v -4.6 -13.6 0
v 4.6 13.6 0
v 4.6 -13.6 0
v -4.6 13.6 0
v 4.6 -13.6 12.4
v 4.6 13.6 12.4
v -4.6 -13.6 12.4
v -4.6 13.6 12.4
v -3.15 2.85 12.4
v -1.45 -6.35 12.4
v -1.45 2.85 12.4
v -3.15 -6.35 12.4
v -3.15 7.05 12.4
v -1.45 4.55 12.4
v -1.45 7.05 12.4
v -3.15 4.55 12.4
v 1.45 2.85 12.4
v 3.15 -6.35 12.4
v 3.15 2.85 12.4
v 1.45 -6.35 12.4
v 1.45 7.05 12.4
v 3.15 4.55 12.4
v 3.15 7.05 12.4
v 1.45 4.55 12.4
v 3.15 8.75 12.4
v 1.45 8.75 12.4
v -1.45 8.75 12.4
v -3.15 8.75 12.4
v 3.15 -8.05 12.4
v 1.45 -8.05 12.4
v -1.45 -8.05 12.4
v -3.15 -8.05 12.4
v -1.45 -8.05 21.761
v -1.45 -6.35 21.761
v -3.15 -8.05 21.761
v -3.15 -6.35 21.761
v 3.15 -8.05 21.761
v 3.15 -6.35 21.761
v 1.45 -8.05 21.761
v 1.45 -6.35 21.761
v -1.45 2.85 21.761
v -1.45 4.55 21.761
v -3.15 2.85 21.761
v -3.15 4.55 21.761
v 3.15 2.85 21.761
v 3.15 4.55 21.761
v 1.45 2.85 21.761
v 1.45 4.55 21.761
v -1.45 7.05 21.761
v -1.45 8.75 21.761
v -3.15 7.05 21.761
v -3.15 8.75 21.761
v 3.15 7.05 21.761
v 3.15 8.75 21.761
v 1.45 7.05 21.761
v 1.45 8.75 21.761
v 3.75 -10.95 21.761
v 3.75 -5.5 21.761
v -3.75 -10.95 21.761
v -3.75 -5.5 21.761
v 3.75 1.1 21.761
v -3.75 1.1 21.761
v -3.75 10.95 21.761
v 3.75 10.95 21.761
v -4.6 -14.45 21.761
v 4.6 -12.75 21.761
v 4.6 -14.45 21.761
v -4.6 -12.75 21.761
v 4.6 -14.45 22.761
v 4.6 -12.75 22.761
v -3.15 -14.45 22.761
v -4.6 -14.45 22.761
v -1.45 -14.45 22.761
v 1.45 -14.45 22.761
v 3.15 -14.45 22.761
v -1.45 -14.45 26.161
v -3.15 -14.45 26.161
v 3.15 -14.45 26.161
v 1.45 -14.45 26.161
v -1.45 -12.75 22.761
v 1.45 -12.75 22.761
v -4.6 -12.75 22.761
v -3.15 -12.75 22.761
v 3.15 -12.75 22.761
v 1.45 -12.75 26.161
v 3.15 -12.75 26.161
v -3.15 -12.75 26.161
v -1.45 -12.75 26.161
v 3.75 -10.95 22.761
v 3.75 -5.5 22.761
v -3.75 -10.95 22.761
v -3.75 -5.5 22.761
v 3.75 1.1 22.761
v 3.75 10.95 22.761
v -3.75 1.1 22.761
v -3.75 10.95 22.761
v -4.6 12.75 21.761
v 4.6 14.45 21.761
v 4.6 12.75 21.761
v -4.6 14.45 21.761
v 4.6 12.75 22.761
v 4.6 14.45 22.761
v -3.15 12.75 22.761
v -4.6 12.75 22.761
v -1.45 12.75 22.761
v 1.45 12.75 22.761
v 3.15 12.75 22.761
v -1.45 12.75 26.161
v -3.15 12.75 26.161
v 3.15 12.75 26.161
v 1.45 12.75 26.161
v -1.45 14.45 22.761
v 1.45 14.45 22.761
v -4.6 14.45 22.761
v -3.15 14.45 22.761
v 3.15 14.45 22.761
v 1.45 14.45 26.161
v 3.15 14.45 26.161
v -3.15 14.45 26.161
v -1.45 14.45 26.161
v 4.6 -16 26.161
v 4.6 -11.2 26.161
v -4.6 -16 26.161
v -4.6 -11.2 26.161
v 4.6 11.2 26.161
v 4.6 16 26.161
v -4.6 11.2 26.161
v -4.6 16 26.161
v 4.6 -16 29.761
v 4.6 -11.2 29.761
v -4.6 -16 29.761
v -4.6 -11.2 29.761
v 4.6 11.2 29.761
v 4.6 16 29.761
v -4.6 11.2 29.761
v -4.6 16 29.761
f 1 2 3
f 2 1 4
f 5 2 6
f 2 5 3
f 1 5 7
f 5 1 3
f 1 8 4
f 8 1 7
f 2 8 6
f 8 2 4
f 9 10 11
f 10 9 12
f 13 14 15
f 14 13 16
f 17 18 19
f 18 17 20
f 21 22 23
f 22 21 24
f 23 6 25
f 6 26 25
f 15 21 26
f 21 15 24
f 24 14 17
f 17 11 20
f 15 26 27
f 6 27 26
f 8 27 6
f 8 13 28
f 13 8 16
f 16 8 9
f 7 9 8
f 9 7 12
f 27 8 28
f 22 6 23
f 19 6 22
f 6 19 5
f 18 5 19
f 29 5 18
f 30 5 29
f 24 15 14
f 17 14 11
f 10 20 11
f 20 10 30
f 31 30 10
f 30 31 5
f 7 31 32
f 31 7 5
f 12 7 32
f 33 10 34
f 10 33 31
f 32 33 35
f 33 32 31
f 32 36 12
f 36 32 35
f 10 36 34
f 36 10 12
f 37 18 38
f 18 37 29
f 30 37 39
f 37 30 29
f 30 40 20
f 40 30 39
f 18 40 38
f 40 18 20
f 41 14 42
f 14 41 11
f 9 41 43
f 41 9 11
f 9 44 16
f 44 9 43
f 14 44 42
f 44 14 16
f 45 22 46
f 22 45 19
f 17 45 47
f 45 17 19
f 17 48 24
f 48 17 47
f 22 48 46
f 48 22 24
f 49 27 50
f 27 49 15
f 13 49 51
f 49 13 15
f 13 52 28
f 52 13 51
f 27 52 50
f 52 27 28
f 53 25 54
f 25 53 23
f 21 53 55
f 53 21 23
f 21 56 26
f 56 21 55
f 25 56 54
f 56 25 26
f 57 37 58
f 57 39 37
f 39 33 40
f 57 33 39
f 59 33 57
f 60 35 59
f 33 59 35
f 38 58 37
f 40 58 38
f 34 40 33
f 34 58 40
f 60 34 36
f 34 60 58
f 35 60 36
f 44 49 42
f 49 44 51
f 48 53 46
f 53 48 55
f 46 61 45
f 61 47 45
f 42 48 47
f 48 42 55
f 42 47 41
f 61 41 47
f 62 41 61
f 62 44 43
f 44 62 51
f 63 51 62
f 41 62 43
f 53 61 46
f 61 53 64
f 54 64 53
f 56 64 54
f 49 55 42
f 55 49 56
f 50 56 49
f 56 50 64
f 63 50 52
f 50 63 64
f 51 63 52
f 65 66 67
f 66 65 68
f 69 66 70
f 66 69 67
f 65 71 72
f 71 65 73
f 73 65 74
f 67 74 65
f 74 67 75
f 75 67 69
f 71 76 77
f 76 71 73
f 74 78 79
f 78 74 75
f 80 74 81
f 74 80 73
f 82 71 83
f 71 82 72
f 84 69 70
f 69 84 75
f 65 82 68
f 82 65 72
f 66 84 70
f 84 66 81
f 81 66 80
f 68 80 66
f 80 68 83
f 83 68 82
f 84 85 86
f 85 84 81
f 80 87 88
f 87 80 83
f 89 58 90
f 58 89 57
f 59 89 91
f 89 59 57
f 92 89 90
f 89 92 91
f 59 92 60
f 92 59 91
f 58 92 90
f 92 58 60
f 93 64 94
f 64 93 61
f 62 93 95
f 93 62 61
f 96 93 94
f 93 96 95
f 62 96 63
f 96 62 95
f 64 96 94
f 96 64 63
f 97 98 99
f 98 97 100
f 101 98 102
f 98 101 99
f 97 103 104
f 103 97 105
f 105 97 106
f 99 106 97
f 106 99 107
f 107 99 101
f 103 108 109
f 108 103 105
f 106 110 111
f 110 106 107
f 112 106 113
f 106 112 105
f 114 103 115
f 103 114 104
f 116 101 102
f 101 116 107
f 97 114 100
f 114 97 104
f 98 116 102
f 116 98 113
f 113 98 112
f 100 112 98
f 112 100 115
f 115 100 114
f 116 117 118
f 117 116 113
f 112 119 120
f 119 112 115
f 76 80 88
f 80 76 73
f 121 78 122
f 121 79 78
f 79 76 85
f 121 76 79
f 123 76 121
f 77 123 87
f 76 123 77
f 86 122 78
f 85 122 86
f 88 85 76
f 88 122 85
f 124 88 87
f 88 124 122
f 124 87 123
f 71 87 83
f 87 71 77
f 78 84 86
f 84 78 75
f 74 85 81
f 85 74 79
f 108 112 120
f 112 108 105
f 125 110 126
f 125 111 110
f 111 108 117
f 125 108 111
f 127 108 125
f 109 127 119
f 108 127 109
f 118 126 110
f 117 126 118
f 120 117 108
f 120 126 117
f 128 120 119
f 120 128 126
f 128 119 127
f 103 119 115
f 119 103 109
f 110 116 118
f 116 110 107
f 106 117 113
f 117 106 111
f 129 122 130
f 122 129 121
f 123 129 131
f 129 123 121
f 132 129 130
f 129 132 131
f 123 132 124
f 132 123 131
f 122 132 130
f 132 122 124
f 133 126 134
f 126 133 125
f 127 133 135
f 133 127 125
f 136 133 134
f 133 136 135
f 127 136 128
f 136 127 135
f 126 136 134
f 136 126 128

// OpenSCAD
// Generated by SolidPython 0.4.2 on 2020-09-29 23:22:29
//!OpenSCAD

scale(v = 0.0100000000) {
	translate(v = [-460, -1360, 0]) {
		union() {
			color(c = [0.4000000000, 0.4000000000, 0.4000000000]) {
				translate(v = [0, 0, 0]) {
					linear_extrude(height = 1000.0000000000) {
						polygon(paths = [[0, 1, 2, 3]], points = [[0, 0], [0, 2720], [920, 2720], [920, 0]]);
					}
				}
			}
			color(c = [0.2000000000, 0.6000000000, 0.2000000000]) {
				translate(v = [0, 0, 1000.0000000000]) {
					linear_extrude(height = 120.0000000000) {
						polygon(paths = [[0, 1, 2, 3]], points = [[0, 1305], [0, 2720], [920, 2720], [920, 1305]]);
					}
				}
			}
			color(c = [0.4000000000, 0.4000000000, 0.4000000000]) {
				translate(v = [0, 0, 1000.0000000000]) {
					linear_extrude(height = 120.0000000000) {
						polygon(paths = [[0, 1, 2, 3]], points = [[0, 0], [0, 1305], [920, 1305], [920, 0]]);
					}
				}
			}
			color(c = [0.2000000000, 0.6000000000, 0.2000000000]) {
				translate(v = [0, 0, 1120.0000000000]) {
					linear_extrude(height = 120.0000000000) {
						polygon(paths = [[0, 1, 2, 3]], points = [[0, 1305], [0, 2720], [920, 2720], [920, 1305]]);
					}
				}
			}
			color(c = [0.4000000000, 0.4000000000, 0.4000000000]) {
				translate(v = [0, 0, 1120.0000000000]) {
					linear_extrude(height = 120.0000000000) {
						polygon(paths = [[0, 1, 2, 3]], points = [[0, 0], [0, 1305], [920, 1305], [920, 0]]);
					}
				}
			}
			color(c = [0.1000000000, 0.1000000000, 0.1000000000]) {
				translate(v = [0, 0, 1240.0000000000]) {
					linear_extrude(height = 70.0000000000) {
						polygon(paths = [[0, 1, 2, 3]], points = [[145, 555], [145, 725], [315, 725], [315, 555]]);
					}
				}
			}
			color(c = [0.1000000000, 0.1000000000, 0.1000000000]) {
				translate(v = [0, 0, 1240.0000000000]) {
					linear_extrude(height = 70.0000000000) {
						polygon(paths = [[0, 1, 2, 3]], points = [[605, 555], [605, 725], [775, 725], [775, 555]]);
					}
				}
			}
			color(c = [0.1000000000, 0.1000000000, 0.1000000000]) {
				translate(v = [0, 0, 1240.0000000000]) {
					linear_extrude(height = 70.0000000000) {
						polygon(paths = [[0, 1, 2, 3]], points = [[145, 1645], [145, 1815], [315, 1815], [315, 1645]]);
					}
				}
			}
			color(c = [0.1000000000, 0.1000000000, 0.1000000000]) {
				translate(v = [0, 0, 1240.0000000000]) {
					linear_extrude(height = 70.0000000000) {
						polygon(paths = [[0, 1, 2, 3]], points = [[605, 1645], [605, 1815], [775, 1815], [775, 1645]]);
					}
				}
			}
			color(c = [0.1000000000, 0.1000000000, 0.1000000000]) {
				translate(v = [0, 0, 1240.0000000000]) {
					linear_extrude(height = 70.0000000000) {
						polygon(paths = [[0, 1, 2, 3]], points = [[145, 2065], [145, 2235], [315, 2235], [315, 2065]]);
					}
				}
			}
			color(c = [0.1000000000, 0.1000000000, 0.1000000000]) {
				translate(v = [0, 0, 1240.0000000000]) {
					linear_extrude(height = 70.0000000000) {
						polygon(paths = [[0, 1, 2, 3]], points = [[605, 2065], [605, 2235], [775, 2235], [775, 2065]]);
					}
				}
			}
			color(c = [0.1000000000, 0.1000000000, 0.1000000000]) {
				translate(v = [0, 0, 1310.0000000000]) {
					linear_extrude(height = 180.0000000000) {
						polygon(paths = [[0, 1, 2, 3]], points = [[145, 555], [145, 725], [315, 725], [315, 555]]);
					}
				}
			}
			color(c = [0.1000000000, 0.1000000000, 0.1000000000]) {
				translate(v = [0, 0, 1310.0000000000]) {
					linear_extrude(height = 180.0000000000) {
						polygon(paths = [[0, 1, 2, 3]], points = [[605, 555], [605, 725], [775, 725], [775, 555]]);
					}
				}
			}
			color(c = [0.1000000000, 0.1000000000, 0.1000000000]) {
				translate(v = [0, 0, 1310.0000000000]) {
					linear_extrude(height = 180.0000000000) {
						polygon(paths = [[0, 1, 2, 3]], points = [[145, 1645], [145, 1815], [315, 1815], [315, 1645]]);
					}
				}
			}
			color(c = [0.1000000000, 0.1000000000, 0.1000000000]) {
				translate(v = [0, 0, 1310.0000000000]) {
					linear_extrude(height = 180.0000000000) {
						polygon(paths = [[0, 1, 2, 3]], points = [[605, 1645], [605, 1815], [775, 1815], [775, 1645]]);
					}
				}
			}
			color(c = [0.1000000000, 0.1000000000, 0.1000000000]) {
				translate(v = [0, 0, 1310.0000000000]) {
					linear_extrude(height = 180.0000000000) {
						polygon(paths = [[0, 1, 2, 3]], points = [[145, 2065], [145, 2235], [315, 2235], [315, 2065]]);
					}
				}
			}
			color(c = [0.1000000000, 0.1000000000, 0.1000000000]) {
				translate(v = [0, 0, 1310.0000000000]) {
					linear_extrude(height = 180.0000000000) {
						polygon(paths = [[0, 1, 2, 3]], points = [[605, 2065], [605, 2235], [775, 2235], [775, 2065]]);
					}
				}
			}
			color(c = [0.1000000000, 0.1000000000, 0.1000000000]) {
				translate(v = [0, 0, 1490.0000000000]) {
					linear_extrude(height = 686.1000000000) {
						polygon(paths = [[0, 1, 2, 3]], points = [[145, 555], [145, 725], [315, 725], [315, 555]]);
					}
				}
			}
			color(c = [0.1000000000, 0.1000000000, 0.1000000000]) {
				translate(v = [0, 0, 1490.0000000000]) {
					linear_extrude(height = 686.1000000000) {
						polygon(paths = [[0, 1, 2, 3]], points = [[605, 555], [605, 725], [775, 725], [775, 555]]);
					}
				}
			}
			color(c = [0.1000000000, 0.1000000000, 0.1000000000]) {
				translate(v = [0, 0, 1490.0000000000]) {
					linear_extrude(height = 686.1000000000) {
						polygon(paths = [[0, 1, 2, 3]], points = [[145, 1645], [145, 1815], [315, 1815], [315, 1645]]);
					}
				}
			}
			color(c = [0.1000000000, 0.1000000000, 0.1000000000]) {
				translate(v = [0, 0, 1490.0000000000]) {
					linear_extrude(height = 686.1000000000) {
						polygon(paths = [[0, 1, 2, 3]], points = [[605, 1645], [605, 1815], [775, 1815], [775, 1645]]);
					}
				}
			}
			color(c = [0.1000000000, 0.1000000000, 0.1000000000]) {
				translate(v = [0, 0, 1490.0000000000]) {
					linear_extrude(height = 686.1000000000) {
						polygon(paths = [[0, 1, 2, 3]], points = [[145, 2065], [145, 2235], [315, 2235], [315, 2065]]);
					}
				}
			}
			color(c = [0.1000000000, 0.1000000000, 0.1000000000]) {
				translate(v = [0, 0, 1490.0000000000]) {
					linear_extrude(height = 686.1000000000) {
						polygon(paths = [[0, 1, 2, 3]], points = [[605, 2065], [605, 2235], [775, 2235], [775, 2065]]);
					}
				}
			}
			color(c = [0.9000000000, 0.6000000000, 0.6000000000]) {
				translate(v = [0, 0, 2176.1000000000]) {
					linear_extrude(height = 100.0000000000) {
						polygon(paths = [[0, 1, 2, 3]], points = [[0, -85], [0, 85], [920, 85], [920, -85]]);
					}
				}
			}
			color(c = [0.9000000000, 0.6000000000, 0.6000000000]) {
				translate(v = [0, 0, 2176.1000000000]) {
					linear_extrude(height = 100.0000000000) {
						polygon(paths = [[0, 1, 2, 3]], points = [[85, 265], [85, 810], [835, 810], [835, 265]]);
					}
				}
			}
			color(c = [0.9000000000, 0.6000000000, 0.6000000000]) {
				translate(v = [0, 0, 2176.1000000000]) {
					linear_extrude(height = 100.0000000000) {
						polygon(paths = [[0, 1, 2, 3]], points = [[85, 1470], [85, 2455], [835, 2455], [835, 1470]]);
					}
				}
			}
			color(c = [0.9000000000, 0.6000000000, 0.6000000000]) {
				translate(v = [0, 0, 2176.1000000000]) {
					linear_extrude(height = 100.0000000000) {
						polygon(paths = [[0, 1, 2, 3]], points = [[0, 2635], [0, 2805], [920, 2805], [920, 2635]]);
					}
				}
			}
			color(c = [0.5000000000, 0.5000000000, 0.5000000000]) {
				translate(v = [0, 0, 2276.1000000000]) {
					linear_extrude(height = 340.0000000000) {
						polygon(paths = [[0, 1, 2, 3]], points = [[145, -85], [145, 85], [315, 85], [315, -85]]);
					}
				}
			}
			color(c = [0.5000000000, 0.5000000000, 0.5000000000]) {
				translate(v = [0, 0, 2276.1000000000]) {
					linear_extrude(height = 340.0000000000) {
						polygon(paths = [[0, 1, 2, 3]], points = [[605, -85], [605, 85], [775, 85], [775, -85]]);
					}
				}
			}
			color(c = [0.5000000000, 0.5000000000, 0.5000000000]) {
				translate(v = [0, 0, 2276.1000000000]) {
					linear_extrude(height = 340.0000000000) {
						polygon(paths = [[0, 1, 2, 3]], points = [[145, 2635], [145, 2805], [315, 2805], [315, 2635]]);
					}
				}
			}
			color(c = [0.5000000000, 0.5000000000, 0.5000000000]) {
				translate(v = [0, 0, 2276.1000000000]) {
					linear_extrude(height = 340.0000000000) {
						polygon(paths = [[0, 1, 2, 3]], points = [[605, 2635], [605, 2805], [775, 2805], [775, 2635]]);
					}
				}
			}
			color(c = [0.3000000000, 0.3000000000, 1]) {
				translate(v = [0, 0, 2616.1000000000]) {
					linear_extrude(height = 360.0000000000) {
						polygon(paths = [[0, 1, 2, 3]], points = [[0, -240], [0, 240], [920, 240], [920, -240]]);
					}
				}
			}
			color(c = [0.3000000000, 0.3000000000, 1]) {
				translate(v = [0, 0, 2616.1000000000]) {
					linear_extrude(height = 360.0000000000) {
						polygon(paths = [[0, 1, 2, 3]], points = [[0, 2480], [0, 2960], [920, 2960], [920, 2480]]);
					}
				}
			}
		}
	}
}
